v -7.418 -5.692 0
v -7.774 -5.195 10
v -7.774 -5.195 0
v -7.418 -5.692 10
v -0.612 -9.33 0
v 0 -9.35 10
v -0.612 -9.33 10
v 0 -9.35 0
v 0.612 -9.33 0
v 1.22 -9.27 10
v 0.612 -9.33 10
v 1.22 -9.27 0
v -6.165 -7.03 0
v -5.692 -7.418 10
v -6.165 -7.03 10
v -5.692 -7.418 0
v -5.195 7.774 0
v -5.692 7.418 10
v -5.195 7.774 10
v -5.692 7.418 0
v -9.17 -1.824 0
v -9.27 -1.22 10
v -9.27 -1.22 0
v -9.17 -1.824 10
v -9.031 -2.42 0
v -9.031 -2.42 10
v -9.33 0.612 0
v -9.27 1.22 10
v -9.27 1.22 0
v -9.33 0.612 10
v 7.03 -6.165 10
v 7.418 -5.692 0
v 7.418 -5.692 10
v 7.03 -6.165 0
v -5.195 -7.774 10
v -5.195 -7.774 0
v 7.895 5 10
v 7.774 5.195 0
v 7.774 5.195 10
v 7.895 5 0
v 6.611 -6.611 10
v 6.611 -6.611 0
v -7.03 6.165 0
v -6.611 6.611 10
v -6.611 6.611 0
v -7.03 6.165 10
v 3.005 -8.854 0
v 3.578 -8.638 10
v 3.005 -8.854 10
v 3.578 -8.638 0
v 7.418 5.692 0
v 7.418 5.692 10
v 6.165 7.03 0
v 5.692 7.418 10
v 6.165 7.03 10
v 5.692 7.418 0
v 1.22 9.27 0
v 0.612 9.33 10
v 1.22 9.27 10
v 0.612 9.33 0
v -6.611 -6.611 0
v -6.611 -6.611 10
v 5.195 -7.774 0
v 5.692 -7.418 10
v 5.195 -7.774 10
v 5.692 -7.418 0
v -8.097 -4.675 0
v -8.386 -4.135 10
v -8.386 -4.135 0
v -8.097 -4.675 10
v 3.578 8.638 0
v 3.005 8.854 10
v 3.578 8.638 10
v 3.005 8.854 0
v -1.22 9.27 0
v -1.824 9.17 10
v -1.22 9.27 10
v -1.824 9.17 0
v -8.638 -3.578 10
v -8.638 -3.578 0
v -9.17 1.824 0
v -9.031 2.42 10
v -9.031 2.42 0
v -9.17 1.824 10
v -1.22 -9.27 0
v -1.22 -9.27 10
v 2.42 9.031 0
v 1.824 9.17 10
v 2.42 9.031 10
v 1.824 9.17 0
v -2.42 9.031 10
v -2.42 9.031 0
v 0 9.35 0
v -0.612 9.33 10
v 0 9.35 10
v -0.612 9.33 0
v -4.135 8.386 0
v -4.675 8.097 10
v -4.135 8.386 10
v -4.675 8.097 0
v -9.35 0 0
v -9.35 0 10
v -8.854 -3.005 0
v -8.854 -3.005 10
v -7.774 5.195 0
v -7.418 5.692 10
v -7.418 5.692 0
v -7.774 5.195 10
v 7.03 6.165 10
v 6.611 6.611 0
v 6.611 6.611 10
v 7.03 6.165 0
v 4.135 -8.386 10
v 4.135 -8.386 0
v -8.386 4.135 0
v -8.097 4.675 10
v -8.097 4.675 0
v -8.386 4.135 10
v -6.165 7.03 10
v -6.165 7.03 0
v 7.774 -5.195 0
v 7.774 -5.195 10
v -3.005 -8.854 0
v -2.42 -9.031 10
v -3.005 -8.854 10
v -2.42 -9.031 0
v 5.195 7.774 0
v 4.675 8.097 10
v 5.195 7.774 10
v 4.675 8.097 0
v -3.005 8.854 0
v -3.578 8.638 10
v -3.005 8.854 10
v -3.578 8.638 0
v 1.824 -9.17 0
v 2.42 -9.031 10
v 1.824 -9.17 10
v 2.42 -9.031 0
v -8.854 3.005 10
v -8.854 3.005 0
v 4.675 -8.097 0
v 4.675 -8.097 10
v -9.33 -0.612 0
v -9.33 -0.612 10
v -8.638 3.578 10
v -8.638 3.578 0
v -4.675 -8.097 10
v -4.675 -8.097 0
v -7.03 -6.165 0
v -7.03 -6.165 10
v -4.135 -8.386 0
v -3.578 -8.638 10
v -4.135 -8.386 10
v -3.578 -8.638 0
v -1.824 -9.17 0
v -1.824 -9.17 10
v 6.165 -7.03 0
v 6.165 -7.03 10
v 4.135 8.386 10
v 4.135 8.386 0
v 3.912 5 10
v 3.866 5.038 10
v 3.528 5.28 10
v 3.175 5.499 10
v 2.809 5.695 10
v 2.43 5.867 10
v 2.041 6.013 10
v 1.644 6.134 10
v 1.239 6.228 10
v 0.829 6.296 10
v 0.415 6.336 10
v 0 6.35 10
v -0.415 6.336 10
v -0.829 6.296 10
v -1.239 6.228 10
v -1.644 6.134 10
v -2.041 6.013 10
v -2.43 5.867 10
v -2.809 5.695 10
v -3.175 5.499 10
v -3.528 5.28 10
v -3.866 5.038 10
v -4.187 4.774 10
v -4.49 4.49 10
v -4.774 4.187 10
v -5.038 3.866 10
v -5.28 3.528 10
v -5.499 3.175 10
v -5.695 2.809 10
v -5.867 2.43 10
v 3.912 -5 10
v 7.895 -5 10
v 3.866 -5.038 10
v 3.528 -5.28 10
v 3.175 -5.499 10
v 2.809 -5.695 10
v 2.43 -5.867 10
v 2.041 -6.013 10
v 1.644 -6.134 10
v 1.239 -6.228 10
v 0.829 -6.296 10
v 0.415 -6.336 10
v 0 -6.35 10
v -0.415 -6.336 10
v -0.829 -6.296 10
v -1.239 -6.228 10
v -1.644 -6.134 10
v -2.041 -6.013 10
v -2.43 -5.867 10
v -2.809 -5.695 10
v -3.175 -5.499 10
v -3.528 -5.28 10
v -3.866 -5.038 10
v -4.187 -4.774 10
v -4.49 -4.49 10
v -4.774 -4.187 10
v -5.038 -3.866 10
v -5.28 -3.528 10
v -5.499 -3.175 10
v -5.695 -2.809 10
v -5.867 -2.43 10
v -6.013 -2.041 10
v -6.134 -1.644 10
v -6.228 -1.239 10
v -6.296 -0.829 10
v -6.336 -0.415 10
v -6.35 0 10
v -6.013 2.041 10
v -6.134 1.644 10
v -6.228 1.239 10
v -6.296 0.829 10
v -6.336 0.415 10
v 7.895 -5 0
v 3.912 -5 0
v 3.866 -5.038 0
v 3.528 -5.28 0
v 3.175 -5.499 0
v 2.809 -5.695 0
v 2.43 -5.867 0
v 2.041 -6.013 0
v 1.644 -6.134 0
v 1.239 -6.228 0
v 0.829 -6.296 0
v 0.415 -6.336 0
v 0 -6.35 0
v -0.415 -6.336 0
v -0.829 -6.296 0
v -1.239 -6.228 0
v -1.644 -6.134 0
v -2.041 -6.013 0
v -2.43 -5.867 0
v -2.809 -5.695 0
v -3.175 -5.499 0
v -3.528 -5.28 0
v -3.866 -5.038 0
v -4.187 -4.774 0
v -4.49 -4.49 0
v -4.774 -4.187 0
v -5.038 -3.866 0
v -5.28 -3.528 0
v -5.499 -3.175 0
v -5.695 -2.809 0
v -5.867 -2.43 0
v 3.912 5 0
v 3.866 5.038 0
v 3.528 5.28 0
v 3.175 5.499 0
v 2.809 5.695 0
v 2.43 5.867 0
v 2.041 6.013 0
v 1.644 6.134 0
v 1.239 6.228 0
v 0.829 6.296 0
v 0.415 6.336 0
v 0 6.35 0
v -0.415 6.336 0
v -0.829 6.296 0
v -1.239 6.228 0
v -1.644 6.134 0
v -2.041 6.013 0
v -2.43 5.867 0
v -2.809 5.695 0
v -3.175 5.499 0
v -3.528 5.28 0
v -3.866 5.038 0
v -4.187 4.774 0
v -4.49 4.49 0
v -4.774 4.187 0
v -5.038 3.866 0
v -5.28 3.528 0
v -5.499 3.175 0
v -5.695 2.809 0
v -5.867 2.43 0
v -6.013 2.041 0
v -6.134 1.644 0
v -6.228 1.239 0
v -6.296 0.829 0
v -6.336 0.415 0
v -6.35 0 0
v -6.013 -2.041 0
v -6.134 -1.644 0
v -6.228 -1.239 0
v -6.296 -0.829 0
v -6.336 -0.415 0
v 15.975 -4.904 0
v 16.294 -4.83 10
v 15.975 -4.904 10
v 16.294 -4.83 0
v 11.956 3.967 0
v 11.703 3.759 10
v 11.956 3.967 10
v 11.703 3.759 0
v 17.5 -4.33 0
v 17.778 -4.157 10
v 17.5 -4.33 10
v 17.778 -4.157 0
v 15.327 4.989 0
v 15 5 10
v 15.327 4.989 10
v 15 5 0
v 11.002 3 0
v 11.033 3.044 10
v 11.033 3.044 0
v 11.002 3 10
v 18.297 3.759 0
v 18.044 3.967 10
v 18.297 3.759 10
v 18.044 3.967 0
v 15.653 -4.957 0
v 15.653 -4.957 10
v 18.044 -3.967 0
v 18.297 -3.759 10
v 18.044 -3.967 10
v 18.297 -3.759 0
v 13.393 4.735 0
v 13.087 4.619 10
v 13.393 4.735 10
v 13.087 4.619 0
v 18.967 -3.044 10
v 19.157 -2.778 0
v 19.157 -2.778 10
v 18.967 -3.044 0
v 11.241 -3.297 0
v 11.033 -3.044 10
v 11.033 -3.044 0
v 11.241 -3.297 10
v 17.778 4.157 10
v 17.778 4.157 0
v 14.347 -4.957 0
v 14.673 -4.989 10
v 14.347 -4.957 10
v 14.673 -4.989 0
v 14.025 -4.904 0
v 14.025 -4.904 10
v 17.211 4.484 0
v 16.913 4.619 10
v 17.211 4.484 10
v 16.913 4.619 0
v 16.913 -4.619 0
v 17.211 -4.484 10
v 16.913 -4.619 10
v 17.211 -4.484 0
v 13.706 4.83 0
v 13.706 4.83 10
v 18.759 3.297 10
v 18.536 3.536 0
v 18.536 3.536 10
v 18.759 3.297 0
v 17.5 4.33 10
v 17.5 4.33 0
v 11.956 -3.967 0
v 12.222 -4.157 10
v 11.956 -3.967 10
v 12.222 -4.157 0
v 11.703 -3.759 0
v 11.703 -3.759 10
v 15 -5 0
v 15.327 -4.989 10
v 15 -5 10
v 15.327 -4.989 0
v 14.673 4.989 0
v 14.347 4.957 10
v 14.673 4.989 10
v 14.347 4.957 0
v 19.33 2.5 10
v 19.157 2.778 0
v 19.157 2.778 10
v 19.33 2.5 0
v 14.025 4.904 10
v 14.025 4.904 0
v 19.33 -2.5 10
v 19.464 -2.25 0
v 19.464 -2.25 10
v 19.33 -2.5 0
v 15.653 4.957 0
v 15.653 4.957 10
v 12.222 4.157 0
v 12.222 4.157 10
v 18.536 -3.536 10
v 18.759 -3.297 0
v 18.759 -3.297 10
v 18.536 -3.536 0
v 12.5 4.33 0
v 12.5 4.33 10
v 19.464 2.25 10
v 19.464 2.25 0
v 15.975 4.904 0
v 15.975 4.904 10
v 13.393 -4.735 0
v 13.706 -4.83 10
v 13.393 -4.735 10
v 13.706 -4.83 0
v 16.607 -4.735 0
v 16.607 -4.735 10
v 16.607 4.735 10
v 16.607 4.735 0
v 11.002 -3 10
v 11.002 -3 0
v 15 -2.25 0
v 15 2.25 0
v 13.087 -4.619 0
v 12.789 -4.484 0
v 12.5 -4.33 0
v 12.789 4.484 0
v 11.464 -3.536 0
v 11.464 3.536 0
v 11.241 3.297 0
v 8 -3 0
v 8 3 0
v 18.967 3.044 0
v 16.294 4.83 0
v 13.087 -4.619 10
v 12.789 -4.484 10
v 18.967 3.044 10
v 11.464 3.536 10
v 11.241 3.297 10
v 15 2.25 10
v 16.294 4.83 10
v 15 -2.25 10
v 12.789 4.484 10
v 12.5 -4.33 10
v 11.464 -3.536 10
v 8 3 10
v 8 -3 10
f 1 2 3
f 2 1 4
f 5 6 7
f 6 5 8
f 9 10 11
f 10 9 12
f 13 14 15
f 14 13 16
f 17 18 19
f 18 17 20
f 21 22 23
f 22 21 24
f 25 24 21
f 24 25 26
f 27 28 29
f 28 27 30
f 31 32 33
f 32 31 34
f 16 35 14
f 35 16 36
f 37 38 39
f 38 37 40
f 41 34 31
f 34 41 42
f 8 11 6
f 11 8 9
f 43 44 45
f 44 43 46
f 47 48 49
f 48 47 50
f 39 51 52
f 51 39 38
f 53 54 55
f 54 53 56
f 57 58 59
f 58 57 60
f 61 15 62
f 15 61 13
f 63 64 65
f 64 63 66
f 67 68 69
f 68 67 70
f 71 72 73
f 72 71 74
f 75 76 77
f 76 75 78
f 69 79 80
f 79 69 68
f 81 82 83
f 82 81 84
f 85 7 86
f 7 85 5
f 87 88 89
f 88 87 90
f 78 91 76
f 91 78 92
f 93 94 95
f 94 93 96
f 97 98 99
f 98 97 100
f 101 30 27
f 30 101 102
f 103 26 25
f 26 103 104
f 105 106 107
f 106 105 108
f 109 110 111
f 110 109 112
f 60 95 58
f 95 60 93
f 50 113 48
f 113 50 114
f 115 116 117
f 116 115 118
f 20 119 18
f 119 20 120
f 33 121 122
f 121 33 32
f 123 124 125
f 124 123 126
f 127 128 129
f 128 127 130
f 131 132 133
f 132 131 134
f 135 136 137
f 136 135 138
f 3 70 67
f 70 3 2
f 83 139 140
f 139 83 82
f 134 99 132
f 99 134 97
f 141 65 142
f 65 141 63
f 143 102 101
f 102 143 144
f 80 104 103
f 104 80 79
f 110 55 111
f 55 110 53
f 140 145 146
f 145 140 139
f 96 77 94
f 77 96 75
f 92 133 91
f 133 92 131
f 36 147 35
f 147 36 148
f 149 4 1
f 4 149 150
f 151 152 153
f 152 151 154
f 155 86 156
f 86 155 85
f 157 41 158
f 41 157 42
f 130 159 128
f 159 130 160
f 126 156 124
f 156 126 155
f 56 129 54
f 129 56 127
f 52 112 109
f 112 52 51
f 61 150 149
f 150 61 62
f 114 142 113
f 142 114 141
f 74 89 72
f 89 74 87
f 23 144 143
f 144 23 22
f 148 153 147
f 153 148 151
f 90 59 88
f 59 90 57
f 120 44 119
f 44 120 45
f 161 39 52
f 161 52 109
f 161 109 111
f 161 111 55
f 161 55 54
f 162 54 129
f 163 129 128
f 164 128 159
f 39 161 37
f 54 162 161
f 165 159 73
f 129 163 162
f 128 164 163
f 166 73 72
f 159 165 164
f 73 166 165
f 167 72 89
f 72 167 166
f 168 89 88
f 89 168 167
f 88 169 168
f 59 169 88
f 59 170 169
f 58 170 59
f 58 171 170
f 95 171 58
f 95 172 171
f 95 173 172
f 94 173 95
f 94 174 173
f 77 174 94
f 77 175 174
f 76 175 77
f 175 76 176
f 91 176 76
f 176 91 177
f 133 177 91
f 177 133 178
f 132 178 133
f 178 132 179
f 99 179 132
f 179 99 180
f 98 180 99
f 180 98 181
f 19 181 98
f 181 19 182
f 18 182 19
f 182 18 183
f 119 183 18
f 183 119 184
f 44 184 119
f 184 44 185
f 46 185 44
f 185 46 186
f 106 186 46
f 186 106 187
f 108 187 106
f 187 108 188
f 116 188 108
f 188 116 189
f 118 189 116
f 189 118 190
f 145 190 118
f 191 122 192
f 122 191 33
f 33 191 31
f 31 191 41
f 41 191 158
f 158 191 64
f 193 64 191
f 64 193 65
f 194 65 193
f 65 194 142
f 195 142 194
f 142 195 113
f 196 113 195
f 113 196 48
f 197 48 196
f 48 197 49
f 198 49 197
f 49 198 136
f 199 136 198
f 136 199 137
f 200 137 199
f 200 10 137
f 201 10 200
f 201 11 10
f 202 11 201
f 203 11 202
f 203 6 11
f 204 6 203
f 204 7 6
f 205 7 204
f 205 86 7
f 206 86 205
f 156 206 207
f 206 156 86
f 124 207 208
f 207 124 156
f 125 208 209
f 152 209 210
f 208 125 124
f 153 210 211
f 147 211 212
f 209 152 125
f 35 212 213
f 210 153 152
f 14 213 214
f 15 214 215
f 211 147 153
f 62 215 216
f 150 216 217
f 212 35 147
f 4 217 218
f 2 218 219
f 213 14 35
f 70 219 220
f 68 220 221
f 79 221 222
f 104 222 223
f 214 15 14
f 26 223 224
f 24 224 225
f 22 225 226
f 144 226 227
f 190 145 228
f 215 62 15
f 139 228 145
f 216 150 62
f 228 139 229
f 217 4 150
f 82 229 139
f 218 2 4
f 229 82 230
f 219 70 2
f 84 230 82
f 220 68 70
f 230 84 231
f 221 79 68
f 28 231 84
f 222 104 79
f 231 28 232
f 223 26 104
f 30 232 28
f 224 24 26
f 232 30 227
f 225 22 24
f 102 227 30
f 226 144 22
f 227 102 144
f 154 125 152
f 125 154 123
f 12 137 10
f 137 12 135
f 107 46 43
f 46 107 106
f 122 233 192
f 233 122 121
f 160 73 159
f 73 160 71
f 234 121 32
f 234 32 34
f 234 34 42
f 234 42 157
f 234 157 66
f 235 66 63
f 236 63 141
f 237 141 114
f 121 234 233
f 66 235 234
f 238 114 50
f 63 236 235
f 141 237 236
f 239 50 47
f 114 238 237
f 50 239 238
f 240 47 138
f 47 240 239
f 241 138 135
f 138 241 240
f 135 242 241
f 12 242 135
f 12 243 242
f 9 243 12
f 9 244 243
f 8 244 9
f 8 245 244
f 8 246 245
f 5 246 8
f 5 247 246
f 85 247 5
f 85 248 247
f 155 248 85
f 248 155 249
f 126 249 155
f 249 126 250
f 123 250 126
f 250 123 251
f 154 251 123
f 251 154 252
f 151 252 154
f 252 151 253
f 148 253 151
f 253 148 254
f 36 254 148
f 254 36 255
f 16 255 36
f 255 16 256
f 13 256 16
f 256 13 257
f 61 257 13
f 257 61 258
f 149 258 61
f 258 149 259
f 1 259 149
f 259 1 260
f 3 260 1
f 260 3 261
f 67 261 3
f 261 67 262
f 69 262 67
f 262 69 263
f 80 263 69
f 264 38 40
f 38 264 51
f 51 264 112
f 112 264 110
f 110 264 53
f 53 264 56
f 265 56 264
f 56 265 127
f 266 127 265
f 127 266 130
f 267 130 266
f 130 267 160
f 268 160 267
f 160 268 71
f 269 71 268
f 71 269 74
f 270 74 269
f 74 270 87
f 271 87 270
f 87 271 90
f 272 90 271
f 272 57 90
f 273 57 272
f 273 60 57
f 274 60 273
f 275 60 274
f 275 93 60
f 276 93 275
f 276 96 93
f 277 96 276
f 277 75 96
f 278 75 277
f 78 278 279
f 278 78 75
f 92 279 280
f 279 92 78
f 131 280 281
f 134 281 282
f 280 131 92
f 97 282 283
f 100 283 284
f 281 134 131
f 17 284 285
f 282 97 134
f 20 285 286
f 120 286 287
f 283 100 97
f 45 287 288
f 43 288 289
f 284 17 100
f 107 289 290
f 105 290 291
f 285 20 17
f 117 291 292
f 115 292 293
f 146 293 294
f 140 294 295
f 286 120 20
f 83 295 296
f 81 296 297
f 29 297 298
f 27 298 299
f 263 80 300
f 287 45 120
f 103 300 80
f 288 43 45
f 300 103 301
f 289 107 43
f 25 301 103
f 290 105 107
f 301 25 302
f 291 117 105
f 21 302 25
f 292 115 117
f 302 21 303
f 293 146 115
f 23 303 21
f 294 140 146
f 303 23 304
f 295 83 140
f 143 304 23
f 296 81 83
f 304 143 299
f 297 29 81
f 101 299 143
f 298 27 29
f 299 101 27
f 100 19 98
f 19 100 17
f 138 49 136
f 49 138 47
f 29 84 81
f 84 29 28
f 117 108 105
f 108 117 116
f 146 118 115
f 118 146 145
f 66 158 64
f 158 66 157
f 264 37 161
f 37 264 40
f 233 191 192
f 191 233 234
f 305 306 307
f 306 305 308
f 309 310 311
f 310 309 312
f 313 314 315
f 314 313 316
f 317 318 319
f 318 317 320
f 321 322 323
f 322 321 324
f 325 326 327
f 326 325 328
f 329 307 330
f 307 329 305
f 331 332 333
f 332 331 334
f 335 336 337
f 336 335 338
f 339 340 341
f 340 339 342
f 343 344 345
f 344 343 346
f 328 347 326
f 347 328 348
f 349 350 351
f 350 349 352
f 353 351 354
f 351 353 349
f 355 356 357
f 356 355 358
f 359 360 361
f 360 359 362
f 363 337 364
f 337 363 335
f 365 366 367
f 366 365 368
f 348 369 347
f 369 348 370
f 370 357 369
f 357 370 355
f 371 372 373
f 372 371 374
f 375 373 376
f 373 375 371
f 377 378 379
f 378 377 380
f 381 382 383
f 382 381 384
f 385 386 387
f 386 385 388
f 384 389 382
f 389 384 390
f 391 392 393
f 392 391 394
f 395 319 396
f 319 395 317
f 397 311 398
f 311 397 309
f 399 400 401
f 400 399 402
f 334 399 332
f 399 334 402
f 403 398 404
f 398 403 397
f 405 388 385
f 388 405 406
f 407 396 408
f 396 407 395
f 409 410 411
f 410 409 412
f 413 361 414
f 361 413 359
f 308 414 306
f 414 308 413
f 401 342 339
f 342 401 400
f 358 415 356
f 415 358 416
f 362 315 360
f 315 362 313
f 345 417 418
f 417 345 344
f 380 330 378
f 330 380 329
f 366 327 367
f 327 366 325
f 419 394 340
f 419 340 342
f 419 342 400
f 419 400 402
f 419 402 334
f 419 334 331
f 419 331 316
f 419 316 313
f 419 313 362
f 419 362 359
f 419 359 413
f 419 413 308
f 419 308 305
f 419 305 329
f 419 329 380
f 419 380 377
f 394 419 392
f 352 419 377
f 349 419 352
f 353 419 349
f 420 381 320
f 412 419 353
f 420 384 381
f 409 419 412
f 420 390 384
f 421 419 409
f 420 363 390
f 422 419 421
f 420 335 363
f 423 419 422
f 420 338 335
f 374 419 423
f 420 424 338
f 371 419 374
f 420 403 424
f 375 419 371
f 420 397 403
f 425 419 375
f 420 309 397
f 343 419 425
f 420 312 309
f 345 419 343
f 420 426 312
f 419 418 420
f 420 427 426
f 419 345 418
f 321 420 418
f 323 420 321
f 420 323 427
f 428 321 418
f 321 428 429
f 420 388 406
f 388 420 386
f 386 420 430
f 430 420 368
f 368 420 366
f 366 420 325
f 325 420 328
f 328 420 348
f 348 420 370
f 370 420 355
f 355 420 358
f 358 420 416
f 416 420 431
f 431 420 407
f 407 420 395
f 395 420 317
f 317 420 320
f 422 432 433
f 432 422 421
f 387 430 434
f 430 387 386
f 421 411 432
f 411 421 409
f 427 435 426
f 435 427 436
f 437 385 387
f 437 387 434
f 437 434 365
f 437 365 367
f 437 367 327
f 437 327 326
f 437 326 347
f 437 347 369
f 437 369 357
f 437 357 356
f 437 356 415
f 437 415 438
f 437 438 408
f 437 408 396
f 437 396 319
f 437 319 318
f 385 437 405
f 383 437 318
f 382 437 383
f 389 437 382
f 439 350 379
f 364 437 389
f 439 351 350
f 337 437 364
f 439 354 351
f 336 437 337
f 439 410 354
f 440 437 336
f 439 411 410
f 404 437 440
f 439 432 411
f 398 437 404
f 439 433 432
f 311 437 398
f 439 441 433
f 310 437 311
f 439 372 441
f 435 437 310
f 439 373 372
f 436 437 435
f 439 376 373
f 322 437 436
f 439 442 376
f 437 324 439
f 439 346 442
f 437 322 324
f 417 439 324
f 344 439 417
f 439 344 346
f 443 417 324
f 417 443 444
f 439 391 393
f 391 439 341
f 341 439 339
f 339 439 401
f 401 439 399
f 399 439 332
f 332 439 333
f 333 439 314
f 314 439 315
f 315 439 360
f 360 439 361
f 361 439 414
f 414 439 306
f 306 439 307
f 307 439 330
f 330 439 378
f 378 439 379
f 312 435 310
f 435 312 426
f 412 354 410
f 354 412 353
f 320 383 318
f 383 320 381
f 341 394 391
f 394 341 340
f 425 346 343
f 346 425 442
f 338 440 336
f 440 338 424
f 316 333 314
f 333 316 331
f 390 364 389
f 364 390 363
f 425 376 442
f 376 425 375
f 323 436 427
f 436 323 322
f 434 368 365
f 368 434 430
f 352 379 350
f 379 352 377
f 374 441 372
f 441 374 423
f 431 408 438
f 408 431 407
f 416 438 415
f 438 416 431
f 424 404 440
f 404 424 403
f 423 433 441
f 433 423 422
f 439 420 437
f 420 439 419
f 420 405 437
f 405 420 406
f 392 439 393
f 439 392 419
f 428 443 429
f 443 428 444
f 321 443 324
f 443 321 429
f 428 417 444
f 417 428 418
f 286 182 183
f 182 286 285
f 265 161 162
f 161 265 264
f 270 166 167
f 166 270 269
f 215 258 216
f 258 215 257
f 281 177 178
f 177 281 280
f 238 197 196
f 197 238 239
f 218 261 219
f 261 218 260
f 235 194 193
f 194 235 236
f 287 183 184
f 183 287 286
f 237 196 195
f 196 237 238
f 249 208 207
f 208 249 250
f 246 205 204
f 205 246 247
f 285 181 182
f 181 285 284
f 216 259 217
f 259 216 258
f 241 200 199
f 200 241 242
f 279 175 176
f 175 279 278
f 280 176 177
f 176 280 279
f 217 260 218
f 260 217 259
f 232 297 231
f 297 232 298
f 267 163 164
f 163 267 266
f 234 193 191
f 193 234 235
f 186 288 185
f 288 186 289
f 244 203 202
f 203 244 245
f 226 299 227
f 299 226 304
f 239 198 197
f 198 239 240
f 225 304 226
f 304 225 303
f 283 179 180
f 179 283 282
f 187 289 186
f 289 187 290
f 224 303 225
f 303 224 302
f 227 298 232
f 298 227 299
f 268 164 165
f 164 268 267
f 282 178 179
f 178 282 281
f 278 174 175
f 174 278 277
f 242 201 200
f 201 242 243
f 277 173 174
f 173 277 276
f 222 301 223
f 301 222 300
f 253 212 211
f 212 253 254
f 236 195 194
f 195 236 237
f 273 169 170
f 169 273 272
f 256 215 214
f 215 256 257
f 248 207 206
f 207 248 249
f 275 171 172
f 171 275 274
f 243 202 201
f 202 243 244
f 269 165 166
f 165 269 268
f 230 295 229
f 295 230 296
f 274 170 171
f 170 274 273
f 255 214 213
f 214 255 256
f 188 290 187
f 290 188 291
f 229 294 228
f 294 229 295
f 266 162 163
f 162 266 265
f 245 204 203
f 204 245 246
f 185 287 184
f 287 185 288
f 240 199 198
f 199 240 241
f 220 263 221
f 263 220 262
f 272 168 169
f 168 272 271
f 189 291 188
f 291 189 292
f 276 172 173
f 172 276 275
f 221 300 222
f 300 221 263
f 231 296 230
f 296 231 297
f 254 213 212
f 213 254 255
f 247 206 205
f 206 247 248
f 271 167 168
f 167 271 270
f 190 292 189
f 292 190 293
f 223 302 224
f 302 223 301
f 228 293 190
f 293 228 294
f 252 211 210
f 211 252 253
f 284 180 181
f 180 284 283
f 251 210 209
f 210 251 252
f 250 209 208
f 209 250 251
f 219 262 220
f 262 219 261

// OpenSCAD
// Snap clip for tubing next to a 12.7 mm lab stand rod
// Print orientation: flat on the bed, extruded upward in +Z

$fn = 96;

// ---- Dimensions (mm) ----
rod_d      = 12.7;   // stand rod diameter
ring_w     = 3;      // rod ring wall thickness
ring_od    = rod_d + 2*ring_w; // rod ring outer diameter (18.7)
ring_h     = 10;     // clip height (Z)
ring_open  = 10;     // rod ring opening width on -X side

tub_d      = 6;      // tubing inner diameter
tub_w      = 2;      // tubing ring wall thickness
tub_od     = tub_d + 2*tub_w; // tubing ring outer diameter (10)
tub_x      = 15;     // tubing ring centre X
tub_h      = 10;     // clip height (Z)
tub_open   = 4.5;    // tubing ring opening width on +X side

bridge_x1  = 8;      // bridge start X
bridge_x2  = 12;     // bridge end X
bridge_w   = 6;      // bridge width (Y)

eps        = 0.5;    // cutter overshoot past faces

// ---- Model ----
difference() {
    union() {
        // Rod ring
        difference() {
            cylinder(d = ring_od, h = ring_h);
            translate([0, -ring_open/2, -eps])
                cube([ring_open + eps, ring_open, ring_h + 2*eps]);
        }
        // Tubing ring
        translate([tub_x, 0, 0])
            difference() {
                cylinder(d = tub_od, h = tub_h);
                translate([0, -tub_open/2, -eps])
                    cube([tub_open + eps, tub_open, tub_h + 2*eps]);
            }
        // Bridge
        translate([bridge_x1, -bridge_w/2, 0])
            cube([bridge_x2 - bridge_x1, bridge_w, ring_h]);
    }
    // Rod inner hole, running through the full height
    translate([0, 0, -eps])
        cylinder(d = rod_d, h = ring_h + 2*eps);
}
